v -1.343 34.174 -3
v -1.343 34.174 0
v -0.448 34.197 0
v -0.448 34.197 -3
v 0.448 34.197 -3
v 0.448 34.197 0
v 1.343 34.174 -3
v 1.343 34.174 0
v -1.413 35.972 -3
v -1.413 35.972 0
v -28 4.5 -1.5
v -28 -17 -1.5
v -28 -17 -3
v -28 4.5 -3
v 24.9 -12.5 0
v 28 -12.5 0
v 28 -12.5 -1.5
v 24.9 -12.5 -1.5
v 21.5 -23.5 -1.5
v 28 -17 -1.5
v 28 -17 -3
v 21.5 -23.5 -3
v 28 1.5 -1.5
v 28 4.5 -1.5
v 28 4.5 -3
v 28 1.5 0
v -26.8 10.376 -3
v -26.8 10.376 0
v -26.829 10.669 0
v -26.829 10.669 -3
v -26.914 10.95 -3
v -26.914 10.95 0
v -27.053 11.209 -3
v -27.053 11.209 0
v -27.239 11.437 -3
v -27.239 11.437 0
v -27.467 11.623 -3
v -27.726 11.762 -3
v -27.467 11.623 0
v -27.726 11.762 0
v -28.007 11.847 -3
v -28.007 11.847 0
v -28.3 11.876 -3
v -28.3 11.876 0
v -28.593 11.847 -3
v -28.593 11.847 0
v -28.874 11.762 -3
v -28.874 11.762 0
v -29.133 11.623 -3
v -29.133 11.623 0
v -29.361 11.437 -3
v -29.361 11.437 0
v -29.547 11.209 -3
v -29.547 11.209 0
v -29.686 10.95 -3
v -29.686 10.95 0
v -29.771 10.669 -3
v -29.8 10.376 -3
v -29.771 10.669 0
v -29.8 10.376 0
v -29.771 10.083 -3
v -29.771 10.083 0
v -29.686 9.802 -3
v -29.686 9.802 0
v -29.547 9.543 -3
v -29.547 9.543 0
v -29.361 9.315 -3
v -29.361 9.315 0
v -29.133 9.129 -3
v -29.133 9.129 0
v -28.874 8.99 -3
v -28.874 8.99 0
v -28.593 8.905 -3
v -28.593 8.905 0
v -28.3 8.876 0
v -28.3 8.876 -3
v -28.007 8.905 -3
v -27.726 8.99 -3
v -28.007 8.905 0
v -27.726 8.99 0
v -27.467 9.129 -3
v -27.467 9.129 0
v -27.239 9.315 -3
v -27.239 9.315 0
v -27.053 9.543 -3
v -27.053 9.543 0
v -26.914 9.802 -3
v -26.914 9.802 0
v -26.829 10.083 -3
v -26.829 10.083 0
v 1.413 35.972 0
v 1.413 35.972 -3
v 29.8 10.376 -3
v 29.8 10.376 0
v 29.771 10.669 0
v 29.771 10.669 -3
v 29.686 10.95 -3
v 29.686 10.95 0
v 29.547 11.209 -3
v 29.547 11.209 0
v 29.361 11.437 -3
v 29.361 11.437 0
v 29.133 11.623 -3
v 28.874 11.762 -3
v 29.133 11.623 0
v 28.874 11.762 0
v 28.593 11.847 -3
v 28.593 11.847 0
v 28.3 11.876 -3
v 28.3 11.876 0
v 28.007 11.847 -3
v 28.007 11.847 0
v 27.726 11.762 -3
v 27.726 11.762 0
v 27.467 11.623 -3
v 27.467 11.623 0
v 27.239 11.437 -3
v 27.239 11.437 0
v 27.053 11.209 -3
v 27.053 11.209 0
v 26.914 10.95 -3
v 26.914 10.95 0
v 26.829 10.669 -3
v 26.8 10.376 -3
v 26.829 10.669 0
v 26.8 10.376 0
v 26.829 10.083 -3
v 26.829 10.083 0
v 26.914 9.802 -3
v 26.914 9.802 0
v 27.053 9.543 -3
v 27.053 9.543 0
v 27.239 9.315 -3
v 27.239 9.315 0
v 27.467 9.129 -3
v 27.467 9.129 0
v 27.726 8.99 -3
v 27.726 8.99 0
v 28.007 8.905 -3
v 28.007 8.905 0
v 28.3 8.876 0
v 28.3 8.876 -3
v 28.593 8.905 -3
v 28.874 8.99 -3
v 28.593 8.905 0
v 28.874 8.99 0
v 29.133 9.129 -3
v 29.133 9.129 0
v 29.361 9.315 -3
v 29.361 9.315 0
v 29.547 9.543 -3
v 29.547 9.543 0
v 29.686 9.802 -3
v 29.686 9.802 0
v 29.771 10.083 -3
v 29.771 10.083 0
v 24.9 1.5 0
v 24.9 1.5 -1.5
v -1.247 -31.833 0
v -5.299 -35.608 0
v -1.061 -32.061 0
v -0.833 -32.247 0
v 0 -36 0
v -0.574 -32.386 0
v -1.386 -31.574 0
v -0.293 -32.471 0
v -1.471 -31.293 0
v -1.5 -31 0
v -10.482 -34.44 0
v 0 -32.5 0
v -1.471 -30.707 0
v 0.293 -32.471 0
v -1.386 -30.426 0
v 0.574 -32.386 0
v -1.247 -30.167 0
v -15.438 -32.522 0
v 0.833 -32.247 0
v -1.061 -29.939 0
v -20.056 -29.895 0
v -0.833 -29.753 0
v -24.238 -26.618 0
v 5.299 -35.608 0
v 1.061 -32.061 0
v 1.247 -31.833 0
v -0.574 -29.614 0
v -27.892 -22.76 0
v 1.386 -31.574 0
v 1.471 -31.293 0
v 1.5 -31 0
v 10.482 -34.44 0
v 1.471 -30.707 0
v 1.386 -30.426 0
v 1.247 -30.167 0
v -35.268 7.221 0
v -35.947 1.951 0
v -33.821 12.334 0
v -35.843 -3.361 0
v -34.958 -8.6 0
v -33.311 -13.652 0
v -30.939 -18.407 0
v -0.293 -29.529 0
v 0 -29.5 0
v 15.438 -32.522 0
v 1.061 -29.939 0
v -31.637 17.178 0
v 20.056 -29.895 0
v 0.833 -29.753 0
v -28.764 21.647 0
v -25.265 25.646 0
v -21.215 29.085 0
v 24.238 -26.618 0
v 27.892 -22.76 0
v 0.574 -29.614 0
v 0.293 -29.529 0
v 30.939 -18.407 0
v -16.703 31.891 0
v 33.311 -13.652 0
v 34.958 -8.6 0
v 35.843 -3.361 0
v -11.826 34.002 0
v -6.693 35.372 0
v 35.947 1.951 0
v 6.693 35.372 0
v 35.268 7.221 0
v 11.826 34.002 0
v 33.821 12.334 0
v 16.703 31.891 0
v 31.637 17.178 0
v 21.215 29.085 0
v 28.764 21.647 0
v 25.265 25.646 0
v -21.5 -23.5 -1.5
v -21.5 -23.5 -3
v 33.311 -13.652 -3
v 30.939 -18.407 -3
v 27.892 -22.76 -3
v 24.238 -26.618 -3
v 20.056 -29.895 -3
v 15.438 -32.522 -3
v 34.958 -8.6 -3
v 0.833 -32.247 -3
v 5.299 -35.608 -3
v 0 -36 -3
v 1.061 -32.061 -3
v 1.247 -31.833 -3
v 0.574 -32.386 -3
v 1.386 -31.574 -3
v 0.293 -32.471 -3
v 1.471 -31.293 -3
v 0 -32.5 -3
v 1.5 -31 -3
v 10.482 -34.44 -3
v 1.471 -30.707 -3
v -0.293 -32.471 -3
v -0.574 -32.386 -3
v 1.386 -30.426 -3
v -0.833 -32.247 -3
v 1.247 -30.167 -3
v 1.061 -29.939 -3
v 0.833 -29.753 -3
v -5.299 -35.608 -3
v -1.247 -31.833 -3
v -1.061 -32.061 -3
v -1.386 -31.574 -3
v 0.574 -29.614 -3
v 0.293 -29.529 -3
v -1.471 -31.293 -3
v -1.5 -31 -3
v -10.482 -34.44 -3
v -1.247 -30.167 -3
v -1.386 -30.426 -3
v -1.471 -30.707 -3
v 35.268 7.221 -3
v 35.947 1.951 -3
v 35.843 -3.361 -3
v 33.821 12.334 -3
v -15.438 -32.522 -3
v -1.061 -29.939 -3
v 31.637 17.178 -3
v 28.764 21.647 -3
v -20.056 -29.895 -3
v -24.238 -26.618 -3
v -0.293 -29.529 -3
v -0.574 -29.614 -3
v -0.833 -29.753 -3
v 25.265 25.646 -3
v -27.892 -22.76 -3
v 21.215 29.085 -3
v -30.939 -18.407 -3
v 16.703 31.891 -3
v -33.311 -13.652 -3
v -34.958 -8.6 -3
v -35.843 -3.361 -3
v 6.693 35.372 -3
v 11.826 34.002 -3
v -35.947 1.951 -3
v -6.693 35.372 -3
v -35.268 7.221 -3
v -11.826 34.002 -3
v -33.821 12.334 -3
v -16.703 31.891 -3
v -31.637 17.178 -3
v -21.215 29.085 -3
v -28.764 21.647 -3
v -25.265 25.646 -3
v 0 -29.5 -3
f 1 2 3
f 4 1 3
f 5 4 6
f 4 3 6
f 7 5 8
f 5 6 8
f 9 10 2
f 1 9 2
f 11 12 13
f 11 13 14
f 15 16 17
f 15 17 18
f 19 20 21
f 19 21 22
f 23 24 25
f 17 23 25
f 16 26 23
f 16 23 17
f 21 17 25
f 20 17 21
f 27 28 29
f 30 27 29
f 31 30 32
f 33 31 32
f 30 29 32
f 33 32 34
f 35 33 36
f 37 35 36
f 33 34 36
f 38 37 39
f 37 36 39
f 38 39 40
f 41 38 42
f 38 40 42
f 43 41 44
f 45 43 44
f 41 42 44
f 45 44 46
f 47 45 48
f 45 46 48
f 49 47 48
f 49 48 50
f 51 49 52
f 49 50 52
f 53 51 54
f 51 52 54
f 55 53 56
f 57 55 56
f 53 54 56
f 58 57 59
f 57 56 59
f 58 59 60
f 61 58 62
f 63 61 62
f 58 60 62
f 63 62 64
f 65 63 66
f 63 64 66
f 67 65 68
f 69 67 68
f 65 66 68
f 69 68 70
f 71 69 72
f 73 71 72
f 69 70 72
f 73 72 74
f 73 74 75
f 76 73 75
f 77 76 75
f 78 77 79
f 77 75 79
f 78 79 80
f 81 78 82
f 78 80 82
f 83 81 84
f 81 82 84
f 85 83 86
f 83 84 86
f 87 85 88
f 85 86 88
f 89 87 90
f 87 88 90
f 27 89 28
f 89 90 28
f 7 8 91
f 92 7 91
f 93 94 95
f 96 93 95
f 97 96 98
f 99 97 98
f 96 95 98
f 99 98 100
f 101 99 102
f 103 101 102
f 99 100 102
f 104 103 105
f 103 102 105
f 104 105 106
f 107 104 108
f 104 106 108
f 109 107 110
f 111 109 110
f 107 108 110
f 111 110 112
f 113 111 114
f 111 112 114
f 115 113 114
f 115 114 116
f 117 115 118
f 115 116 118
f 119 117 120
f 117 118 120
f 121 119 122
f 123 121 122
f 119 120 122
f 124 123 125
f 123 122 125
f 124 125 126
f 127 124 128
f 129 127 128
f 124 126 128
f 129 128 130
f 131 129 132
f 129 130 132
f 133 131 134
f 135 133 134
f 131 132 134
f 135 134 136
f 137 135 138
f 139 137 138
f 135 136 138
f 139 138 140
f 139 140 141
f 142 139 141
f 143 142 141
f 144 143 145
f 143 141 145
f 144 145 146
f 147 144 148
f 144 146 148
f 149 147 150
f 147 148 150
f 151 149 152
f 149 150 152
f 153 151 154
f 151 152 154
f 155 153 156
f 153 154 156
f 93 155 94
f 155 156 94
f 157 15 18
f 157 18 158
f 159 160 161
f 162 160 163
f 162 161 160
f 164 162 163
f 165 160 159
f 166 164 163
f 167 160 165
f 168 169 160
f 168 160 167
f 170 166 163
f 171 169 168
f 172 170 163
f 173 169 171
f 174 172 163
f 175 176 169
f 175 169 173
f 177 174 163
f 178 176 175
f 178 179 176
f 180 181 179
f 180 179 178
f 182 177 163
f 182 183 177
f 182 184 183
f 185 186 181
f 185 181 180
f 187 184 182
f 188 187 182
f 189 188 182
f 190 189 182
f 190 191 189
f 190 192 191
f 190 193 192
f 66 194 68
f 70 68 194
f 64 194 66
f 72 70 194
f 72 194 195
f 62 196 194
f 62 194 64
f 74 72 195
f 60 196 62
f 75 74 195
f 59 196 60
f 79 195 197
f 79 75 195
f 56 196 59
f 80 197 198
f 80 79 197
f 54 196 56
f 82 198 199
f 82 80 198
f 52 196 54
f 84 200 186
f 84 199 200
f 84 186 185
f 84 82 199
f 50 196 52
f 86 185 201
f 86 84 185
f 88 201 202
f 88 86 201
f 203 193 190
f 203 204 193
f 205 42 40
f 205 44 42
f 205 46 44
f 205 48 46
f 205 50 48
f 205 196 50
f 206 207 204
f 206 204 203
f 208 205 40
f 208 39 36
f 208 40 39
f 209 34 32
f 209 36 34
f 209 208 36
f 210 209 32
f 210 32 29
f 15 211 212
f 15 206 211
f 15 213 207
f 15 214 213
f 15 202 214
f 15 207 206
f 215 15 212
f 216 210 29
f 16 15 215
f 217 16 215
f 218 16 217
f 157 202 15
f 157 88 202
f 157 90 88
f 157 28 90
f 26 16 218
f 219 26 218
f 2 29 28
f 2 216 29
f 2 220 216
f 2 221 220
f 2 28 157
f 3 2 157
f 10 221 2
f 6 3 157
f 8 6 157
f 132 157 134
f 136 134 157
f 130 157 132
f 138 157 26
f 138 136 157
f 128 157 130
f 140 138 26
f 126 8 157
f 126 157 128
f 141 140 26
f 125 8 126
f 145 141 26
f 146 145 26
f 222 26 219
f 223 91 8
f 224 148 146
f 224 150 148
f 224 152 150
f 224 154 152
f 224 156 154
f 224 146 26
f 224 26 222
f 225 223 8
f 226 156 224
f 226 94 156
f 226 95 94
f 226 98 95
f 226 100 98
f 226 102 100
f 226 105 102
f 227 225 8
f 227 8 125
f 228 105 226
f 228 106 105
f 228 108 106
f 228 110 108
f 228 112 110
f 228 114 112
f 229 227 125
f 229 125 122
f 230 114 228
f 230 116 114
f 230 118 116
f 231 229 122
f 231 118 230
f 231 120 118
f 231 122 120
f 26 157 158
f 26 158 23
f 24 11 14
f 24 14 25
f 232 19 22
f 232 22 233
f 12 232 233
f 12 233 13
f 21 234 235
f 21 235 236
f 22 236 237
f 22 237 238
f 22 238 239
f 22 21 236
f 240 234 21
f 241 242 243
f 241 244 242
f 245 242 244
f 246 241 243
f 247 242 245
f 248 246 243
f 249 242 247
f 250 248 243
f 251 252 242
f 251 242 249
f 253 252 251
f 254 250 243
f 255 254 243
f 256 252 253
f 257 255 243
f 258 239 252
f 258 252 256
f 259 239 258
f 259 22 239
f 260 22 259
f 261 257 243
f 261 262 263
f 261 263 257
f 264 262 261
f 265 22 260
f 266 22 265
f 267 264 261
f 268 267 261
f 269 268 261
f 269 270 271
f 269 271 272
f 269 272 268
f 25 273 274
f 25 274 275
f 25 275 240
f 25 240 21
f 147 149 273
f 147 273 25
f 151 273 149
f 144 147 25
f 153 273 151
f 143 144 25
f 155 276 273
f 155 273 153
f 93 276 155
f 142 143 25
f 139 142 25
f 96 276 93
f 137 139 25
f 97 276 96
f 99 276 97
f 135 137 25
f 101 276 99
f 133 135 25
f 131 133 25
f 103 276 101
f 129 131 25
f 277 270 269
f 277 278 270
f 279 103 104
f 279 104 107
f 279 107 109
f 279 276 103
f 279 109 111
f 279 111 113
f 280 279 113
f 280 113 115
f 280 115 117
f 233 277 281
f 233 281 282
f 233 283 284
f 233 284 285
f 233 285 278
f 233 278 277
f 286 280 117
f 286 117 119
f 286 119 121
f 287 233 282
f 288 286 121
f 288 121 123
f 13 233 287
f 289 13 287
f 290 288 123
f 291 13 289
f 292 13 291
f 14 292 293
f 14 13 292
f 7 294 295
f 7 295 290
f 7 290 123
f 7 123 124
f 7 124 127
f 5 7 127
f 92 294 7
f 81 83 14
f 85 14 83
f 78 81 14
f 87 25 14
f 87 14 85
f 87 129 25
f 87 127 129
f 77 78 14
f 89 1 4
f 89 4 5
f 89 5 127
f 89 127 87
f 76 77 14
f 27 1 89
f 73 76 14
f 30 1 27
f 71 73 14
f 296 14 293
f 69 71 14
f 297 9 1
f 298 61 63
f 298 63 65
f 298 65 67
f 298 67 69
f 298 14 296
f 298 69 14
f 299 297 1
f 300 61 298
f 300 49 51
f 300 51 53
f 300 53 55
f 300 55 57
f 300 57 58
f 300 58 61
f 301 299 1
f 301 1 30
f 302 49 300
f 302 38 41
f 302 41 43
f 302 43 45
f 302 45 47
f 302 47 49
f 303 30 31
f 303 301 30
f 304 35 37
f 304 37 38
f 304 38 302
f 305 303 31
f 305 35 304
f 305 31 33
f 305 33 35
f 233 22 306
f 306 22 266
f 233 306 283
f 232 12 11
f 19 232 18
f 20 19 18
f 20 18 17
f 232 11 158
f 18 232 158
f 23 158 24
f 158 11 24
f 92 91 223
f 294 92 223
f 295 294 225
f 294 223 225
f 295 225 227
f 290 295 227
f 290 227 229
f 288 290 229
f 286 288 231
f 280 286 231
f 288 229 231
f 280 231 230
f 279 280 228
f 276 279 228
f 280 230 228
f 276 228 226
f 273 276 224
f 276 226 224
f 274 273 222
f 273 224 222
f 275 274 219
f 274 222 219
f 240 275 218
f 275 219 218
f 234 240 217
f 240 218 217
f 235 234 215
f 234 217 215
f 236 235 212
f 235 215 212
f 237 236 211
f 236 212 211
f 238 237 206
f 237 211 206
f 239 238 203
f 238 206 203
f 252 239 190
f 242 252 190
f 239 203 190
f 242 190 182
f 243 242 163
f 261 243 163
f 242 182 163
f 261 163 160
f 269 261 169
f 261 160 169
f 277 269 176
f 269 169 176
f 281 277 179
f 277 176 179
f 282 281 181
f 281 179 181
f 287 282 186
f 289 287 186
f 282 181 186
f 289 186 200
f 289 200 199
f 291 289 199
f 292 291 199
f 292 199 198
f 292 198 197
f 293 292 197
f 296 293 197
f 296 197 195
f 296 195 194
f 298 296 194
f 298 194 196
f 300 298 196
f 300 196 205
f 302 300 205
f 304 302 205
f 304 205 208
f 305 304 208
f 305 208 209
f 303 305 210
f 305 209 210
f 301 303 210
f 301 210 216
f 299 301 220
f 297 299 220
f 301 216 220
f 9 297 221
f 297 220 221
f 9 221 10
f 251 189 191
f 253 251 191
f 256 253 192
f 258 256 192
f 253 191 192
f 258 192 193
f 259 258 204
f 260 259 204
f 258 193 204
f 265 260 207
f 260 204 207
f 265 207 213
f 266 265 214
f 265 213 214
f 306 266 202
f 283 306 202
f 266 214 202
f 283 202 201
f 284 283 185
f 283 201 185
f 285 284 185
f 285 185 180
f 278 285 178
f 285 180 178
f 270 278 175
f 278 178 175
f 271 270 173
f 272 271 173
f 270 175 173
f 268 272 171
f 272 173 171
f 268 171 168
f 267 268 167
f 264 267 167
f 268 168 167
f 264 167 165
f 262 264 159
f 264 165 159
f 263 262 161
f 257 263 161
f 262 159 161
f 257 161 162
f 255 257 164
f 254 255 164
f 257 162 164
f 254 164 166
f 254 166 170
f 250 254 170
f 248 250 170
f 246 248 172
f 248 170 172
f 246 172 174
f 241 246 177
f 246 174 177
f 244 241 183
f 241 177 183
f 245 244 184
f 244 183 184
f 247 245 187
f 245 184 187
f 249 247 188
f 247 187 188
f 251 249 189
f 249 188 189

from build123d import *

# Parameters (mm, degrees)
SKETCH1_R           = 1.5
BOSS_EXTRUDE3_DEPTH = 3
BOSS_EXTRUDE4_DEPTH = 1.5


with BuildPart() as part:
    # Sketch1 → Boss-Extrude3 (new body)
    with BuildSketch(Plane.XY):
        with BuildLine():
            Line((-1.413353367, 35.972245305), (-1.342685699, 34.173633039))
            ThreePointArc((-1.342685699, 34.173633039), (0, 34.2), (1.342685699, 34.173633039))
            Line((1.342685699, 34.173633039), (1.413353367, 35.972245305))
            ThreePointArc((1.413353367, 35.972245305), (0, -36), (-1.413353367, 35.972245305))
        make_face()
        with Locations((28.3, 10.376069152)):
            Circle(SKETCH1_R, mode=Mode.SUBTRACT)
        with Locations((-28.3, 10.376069152)):
            Circle(SKETCH1_R, mode=Mode.SUBTRACT)
        with Locations((0, -31)):
            Circle(SKETCH1_R, mode=Mode.SUBTRACT)
        Polygon((-28, 4.5), (28, 4.5), (28, -17), (21.5, -23.5), (-21.5, -23.5), (-28, -17), align=None, mode=Mode.SUBTRACT)
    extrude(amount=-BOSS_EXTRUDE3_DEPTH)

    # Sketch1<9> → Boss-Extrude4 (add)
    with BuildSketch(Plane.XY):
        Polygon((28, 4.5), (0, 4.5), (0, -23.5), (21.5, -23.5), (28, -17), (28, -12.5), (24.9, -12.5), (24.9, 1.5), (28, 1.5), align=None)
        Polygon((0, -23.5), (0, 4.5), (-28, 4.5), (-28, -17), (-21.5, -23.5), align=None)
    extrude(amount=-BOSS_EXTRUDE4_DEPTH)


solid = part.part
